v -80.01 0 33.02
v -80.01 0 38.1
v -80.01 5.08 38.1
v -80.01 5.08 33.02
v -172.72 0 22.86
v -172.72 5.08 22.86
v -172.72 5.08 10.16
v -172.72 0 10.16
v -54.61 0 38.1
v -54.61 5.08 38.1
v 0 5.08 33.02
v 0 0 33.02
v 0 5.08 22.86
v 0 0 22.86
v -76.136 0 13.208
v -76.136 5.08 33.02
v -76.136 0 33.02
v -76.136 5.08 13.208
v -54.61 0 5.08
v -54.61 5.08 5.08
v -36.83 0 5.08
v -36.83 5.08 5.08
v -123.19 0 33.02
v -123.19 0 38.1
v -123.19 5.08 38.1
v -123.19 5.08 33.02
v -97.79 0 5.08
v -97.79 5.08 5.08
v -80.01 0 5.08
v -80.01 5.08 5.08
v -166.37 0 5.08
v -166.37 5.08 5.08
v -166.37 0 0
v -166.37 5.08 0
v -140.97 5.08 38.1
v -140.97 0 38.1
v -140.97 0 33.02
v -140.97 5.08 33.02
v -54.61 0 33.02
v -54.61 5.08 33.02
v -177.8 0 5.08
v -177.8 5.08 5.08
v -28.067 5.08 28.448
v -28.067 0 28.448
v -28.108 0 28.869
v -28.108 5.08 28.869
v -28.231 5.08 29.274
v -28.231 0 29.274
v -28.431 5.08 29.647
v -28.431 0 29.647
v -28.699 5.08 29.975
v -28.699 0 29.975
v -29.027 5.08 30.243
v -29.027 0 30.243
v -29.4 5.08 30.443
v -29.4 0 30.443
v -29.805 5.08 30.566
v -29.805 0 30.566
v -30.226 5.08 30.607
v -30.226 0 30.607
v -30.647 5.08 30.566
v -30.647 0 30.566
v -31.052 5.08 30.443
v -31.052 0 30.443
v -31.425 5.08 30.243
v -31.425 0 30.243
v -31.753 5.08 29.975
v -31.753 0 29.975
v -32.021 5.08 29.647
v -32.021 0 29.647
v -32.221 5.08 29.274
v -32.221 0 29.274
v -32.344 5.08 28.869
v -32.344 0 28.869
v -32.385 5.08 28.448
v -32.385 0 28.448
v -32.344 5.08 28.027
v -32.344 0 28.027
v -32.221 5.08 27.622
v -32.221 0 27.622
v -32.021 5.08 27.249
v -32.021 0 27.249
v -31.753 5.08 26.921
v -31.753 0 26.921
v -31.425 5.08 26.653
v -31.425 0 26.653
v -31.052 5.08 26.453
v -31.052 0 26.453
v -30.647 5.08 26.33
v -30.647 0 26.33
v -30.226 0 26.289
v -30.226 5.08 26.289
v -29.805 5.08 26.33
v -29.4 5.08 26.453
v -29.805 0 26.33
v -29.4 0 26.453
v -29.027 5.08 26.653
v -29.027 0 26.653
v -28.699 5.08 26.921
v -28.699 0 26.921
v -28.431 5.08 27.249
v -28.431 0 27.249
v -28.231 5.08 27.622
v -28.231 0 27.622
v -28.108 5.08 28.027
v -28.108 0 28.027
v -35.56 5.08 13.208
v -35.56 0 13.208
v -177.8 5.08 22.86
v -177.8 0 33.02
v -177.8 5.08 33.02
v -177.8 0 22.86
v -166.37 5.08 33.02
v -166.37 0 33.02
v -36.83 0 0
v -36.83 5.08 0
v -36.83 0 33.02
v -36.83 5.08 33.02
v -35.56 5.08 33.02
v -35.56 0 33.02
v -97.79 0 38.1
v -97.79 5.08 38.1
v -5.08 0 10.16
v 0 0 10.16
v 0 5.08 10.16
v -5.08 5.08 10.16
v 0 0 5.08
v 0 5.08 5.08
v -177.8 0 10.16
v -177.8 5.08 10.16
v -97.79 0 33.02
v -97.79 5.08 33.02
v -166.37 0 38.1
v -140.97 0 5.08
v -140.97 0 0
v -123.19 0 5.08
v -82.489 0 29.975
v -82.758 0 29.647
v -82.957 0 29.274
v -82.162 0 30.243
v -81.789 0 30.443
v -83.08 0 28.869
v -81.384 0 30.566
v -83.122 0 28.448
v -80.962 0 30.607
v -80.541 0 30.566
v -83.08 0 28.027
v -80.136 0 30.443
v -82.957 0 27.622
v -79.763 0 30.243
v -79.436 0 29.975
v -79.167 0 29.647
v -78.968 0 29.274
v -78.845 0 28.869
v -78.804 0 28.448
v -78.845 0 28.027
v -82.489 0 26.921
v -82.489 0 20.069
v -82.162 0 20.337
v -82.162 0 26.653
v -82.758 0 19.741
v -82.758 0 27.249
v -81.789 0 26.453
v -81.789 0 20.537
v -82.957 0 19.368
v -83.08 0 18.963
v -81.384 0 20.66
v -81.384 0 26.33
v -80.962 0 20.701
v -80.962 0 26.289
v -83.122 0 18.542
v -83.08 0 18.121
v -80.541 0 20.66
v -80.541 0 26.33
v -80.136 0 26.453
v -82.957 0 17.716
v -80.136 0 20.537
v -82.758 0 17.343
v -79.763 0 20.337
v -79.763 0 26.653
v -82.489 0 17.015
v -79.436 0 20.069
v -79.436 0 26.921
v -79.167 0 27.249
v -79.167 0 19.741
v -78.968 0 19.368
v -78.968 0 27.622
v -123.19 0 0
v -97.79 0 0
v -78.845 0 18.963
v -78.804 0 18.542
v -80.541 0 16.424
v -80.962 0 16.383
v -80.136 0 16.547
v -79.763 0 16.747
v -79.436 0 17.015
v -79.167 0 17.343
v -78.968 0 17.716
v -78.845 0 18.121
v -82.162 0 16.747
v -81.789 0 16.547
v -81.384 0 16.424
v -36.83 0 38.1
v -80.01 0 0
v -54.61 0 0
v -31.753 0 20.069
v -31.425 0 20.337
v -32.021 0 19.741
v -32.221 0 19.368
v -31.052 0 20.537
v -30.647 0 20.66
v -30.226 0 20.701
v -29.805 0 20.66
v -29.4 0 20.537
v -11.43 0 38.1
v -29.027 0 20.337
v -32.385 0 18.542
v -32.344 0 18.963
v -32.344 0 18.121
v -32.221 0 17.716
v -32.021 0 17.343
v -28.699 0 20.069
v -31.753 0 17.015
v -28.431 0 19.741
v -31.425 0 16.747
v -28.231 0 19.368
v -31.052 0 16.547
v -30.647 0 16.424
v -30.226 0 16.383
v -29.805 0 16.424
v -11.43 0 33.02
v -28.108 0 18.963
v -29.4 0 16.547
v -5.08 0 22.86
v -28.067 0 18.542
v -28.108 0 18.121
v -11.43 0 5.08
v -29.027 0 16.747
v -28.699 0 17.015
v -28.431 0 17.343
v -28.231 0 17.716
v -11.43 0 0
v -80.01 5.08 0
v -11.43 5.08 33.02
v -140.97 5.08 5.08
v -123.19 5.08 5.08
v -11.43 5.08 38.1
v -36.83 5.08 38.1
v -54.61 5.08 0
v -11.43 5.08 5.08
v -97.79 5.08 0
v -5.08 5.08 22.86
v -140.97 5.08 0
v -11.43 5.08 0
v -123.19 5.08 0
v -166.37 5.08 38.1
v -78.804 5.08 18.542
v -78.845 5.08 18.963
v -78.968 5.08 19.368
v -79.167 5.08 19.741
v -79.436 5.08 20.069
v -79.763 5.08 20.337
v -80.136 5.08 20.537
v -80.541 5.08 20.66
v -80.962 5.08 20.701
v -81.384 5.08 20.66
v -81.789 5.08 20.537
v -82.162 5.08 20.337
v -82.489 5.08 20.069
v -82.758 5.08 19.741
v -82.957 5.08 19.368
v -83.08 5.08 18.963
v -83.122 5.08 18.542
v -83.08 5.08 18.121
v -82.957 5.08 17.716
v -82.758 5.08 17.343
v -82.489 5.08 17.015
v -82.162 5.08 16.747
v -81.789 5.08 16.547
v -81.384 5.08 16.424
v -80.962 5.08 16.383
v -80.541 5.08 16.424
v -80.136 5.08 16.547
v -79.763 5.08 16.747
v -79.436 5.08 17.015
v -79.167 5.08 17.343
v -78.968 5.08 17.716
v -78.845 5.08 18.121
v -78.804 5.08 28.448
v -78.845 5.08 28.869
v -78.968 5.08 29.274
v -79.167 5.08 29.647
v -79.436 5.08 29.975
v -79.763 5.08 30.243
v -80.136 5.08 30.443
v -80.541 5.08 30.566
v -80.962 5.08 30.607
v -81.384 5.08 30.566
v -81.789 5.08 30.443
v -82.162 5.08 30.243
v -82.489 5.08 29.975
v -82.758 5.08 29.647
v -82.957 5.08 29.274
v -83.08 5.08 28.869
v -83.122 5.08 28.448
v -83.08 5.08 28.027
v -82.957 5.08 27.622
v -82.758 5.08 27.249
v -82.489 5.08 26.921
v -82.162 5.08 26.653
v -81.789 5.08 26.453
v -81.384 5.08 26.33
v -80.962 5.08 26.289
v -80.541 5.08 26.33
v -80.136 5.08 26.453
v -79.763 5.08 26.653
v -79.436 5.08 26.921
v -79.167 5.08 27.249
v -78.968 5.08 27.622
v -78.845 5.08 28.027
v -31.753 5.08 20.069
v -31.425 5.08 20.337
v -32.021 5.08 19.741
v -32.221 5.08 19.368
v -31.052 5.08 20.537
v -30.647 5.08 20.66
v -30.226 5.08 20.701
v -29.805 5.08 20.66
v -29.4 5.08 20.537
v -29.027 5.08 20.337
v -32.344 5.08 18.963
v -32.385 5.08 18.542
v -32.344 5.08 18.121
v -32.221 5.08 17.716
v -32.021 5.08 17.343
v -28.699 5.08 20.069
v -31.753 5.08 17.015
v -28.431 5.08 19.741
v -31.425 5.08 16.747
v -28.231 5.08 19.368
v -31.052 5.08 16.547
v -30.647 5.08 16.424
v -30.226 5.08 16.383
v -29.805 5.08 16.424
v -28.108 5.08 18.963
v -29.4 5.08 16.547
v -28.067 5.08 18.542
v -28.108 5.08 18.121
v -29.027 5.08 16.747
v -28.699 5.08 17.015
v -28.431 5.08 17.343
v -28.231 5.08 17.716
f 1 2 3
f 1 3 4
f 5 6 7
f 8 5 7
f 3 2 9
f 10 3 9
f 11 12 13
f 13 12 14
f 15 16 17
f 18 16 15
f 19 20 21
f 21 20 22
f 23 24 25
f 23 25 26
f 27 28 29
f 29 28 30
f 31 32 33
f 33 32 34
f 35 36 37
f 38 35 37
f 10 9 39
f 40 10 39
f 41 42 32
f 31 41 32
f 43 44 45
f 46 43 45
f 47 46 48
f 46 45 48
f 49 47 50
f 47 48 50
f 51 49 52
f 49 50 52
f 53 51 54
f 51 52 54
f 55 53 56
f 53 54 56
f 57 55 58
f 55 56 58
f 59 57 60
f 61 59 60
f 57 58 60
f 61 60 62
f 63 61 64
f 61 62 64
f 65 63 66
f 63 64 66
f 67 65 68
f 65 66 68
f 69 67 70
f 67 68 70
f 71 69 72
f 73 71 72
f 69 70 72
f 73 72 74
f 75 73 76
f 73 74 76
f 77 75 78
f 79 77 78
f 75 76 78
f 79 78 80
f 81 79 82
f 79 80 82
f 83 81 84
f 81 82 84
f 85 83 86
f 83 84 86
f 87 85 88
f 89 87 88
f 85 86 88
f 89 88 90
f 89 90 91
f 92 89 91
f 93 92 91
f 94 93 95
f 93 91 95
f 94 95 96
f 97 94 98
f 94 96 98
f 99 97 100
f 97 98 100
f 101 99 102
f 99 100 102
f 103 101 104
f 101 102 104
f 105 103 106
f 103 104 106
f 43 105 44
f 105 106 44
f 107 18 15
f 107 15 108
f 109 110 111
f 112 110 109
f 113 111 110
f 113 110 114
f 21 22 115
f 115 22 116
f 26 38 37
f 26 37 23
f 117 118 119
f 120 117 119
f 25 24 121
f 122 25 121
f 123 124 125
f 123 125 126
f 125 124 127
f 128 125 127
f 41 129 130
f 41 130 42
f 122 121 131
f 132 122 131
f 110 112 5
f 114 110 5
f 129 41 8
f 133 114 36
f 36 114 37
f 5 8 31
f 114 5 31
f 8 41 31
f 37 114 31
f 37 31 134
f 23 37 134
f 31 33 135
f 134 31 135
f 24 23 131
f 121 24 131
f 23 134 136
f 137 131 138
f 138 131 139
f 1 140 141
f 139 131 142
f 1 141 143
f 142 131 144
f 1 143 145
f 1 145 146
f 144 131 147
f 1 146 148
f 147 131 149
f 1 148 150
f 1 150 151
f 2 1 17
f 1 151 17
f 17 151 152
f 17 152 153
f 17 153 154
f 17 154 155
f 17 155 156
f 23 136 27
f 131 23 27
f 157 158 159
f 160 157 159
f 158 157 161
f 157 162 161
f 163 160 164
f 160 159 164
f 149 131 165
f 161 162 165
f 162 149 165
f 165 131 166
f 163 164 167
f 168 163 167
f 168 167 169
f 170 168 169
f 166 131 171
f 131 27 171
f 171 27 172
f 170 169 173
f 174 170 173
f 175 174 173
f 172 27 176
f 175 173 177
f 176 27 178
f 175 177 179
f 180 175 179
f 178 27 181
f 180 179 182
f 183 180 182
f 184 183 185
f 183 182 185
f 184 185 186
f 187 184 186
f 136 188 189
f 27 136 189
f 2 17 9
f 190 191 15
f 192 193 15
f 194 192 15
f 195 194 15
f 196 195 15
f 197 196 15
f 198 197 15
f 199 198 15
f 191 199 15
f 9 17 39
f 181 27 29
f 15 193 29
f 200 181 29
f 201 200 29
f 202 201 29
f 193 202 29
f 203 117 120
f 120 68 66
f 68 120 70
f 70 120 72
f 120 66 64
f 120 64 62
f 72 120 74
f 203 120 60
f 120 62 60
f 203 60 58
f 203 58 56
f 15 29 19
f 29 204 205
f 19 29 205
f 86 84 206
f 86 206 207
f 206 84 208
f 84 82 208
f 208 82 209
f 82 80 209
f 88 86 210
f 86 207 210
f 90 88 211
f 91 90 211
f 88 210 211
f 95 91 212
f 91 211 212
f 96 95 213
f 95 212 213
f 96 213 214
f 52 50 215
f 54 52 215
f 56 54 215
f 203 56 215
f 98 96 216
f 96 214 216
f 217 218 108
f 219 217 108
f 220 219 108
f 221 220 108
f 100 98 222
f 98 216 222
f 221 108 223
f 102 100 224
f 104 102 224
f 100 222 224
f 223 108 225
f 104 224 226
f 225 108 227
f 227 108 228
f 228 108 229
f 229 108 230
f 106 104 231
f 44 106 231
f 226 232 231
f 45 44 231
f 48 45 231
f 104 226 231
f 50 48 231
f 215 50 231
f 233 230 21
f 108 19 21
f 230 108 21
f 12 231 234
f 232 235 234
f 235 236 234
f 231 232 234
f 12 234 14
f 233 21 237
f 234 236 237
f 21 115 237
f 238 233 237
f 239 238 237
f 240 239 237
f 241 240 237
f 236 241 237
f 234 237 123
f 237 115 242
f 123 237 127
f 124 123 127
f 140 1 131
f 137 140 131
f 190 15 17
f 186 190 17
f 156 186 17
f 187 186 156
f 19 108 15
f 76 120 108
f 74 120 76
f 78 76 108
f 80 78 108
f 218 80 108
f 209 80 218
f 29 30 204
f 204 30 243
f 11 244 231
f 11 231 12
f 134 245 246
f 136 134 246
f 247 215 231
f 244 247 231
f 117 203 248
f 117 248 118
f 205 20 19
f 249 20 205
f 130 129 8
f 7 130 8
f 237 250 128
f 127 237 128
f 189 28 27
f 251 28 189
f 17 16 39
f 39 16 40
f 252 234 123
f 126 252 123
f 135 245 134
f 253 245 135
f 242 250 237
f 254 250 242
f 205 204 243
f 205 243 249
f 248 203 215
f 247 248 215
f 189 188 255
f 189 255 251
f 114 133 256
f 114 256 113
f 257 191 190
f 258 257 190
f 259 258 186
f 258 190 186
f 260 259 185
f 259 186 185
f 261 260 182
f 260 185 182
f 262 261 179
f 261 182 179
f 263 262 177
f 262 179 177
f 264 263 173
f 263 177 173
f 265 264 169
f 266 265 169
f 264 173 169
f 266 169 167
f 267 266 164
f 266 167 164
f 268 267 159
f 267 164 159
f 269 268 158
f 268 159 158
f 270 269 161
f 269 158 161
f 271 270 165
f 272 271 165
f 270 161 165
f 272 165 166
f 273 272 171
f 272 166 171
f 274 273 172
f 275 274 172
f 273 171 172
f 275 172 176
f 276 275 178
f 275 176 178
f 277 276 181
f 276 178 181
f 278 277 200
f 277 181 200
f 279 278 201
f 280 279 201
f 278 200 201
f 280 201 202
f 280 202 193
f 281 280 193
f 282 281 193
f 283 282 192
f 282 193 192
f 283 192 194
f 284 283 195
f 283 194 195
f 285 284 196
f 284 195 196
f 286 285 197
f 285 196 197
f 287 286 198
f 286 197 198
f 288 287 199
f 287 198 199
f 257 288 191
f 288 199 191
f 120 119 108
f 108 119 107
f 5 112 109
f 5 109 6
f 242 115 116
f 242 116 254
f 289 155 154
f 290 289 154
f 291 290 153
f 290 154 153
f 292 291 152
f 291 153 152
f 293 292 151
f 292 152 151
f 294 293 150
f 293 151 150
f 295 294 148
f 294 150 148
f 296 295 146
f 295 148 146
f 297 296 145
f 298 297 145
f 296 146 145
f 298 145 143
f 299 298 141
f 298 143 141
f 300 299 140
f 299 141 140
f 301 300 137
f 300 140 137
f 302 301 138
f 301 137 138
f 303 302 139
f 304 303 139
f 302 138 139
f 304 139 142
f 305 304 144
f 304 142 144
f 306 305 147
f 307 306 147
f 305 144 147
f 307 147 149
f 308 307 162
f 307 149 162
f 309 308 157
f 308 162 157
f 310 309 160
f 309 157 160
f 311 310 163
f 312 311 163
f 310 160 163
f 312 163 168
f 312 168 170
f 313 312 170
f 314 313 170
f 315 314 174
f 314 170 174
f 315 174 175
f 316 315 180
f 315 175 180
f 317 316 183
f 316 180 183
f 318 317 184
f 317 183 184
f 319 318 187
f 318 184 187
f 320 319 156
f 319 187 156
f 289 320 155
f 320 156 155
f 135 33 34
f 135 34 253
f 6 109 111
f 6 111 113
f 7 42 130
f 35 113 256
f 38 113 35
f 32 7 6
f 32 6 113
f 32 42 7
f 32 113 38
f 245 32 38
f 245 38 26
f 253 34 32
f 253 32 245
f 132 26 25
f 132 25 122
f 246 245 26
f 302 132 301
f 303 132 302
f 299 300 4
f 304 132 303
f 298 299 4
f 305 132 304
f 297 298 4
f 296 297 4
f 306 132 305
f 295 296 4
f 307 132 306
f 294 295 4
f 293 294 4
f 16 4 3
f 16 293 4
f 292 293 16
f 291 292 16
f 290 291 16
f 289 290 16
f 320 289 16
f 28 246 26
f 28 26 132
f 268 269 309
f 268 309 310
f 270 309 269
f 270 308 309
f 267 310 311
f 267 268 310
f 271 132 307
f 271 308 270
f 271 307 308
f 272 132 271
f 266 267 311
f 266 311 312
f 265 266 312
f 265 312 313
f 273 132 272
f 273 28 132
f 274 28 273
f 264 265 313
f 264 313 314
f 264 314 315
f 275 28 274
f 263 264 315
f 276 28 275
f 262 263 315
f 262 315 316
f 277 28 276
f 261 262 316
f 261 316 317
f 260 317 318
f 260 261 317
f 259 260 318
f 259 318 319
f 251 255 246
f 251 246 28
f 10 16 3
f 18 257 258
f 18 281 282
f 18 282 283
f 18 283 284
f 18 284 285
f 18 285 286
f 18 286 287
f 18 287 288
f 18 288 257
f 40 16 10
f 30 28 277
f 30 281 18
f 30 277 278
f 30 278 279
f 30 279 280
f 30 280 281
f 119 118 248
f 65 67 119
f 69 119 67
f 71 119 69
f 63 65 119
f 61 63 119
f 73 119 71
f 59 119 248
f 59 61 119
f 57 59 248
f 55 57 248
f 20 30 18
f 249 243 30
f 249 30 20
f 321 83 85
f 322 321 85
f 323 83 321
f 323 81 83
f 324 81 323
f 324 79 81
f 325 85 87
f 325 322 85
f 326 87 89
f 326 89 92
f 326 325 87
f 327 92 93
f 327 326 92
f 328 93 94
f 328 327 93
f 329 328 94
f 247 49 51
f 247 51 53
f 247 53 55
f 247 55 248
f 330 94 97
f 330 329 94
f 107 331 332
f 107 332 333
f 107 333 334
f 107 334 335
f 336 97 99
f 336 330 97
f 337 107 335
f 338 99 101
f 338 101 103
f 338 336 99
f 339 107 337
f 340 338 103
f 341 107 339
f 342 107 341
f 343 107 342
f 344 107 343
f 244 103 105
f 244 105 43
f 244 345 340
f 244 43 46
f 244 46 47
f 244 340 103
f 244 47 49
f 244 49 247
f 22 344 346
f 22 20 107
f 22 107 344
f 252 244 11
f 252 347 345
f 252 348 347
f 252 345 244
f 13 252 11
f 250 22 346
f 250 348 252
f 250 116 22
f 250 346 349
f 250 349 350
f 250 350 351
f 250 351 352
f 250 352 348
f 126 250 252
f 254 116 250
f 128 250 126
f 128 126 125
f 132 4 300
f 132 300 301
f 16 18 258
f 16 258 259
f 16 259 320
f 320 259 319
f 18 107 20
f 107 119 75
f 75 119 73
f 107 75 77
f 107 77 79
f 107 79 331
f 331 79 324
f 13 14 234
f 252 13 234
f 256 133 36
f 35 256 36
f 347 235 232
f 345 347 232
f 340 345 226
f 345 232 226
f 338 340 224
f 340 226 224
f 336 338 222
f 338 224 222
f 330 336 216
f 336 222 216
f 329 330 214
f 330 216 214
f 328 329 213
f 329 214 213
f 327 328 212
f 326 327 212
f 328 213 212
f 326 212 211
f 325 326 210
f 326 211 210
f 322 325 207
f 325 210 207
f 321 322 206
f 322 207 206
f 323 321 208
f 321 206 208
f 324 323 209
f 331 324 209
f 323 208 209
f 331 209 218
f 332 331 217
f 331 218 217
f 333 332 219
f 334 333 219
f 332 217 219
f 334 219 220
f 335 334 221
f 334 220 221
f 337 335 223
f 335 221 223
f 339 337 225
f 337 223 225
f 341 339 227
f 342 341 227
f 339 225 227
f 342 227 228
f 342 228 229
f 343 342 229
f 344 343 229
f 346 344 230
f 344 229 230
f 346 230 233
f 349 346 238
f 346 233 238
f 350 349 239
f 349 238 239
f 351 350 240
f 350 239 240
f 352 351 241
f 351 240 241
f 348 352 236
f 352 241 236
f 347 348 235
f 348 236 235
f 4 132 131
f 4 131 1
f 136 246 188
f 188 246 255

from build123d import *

# Parameters (mm, degrees)
SKETCH1_W           = 177.8
SKETCH1_H           = 38.1
BOSS_EXTRUDE1_DEPTH = 5.08
SKETCH2_W           = 11.43
SKETCH2_H           = 5.08
CUT_EXTRUDE1_DEPTH  = 5.08
SKETCH3_W           = 11.43
SKETCH3_H           = 5.08
CUT_EXTRUDE2_DEPTH  = 5.08
SKETCH4_W           = 17.78
SKETCH4_H           = 5.08
CUT_EXTRUDE3_DEPTH  = 5.08
LPATTERN1_COUNT     = 3
LPATTERN1_PITCH     = 43.18
SKETCH5_W           = 40.5765
SKETCH5_H           = 19.812
CUT_EXTRUDE4_DEPTH  = 5.08
SKETCH6_W           = 5.08
SKETCH6_H           = 12.7
CUT_EXTRUDE5_DEPTH  = 5.08
SKETCH7_W           = 11.43
SKETCH7_H           = 5.08
SKETCH7_W_2         = 17.78
CUT_EXTRUDE6_DEPTH  = 5.08
SKETCH8_W           = 17.78
SKETCH8_H           = 5.08
CUT_EXTRUDE7_DEPTH  = 5.08
LPATTERN2_COUNT     = 2
LPATTERN2_PITCH     = 43.18
SKETCH9_W           = 5.08
SKETCH9_H           = 12.7
CUT_EXTRUDE8_DEPTH  = 5.08
SKETCH10_R          = 2.159
CUT_EXTRUDE9_DEPTH  = 5.08


with BuildPart() as part:
    # Sketch1 → Boss-Extrude1 (new body)
    with BuildSketch(Plane(origin=(0, 0, 0), x_dir=(1, 0, 0), z_dir=(0, 1, 0))):
        with Locations((-88.9, -19.05)):
            Rectangle(SKETCH1_W, SKETCH1_H)
    extrude(amount=BOSS_EXTRUDE1_DEPTH)

    # Sketch2 → Cut-Extrude1 (cut)
    with BuildSketch(Plane(origin=(0, 5.08, 0), x_dir=(1, 0, 0), z_dir=(0, 1, 0))):
        with Locations((-172.085, -35.56)):
            Rectangle(SKETCH2_W, SKETCH2_H)
    extrude(amount=-CUT_EXTRUDE1_DEPTH, mode=Mode.SUBTRACT)

    # Sketch3 → Cut-Extrude2 (cut)
    with BuildSketch(Plane(origin=(0, 5.08, 0), x_dir=(1, 0, 0), z_dir=(0, 1, 0))):
        with Locations((-5.715, -35.56)):
            Rectangle(SKETCH3_W, SKETCH3_H)
    extrude(amount=-CUT_EXTRUDE2_DEPTH, mode=Mode.SUBTRACT)

    # Sketch4 → Cut-Extrude3 (cut)
    with BuildSketch(Plane(origin=(0, 5.08, 0), x_dir=(1, 0, 0), z_dir=(0, 1, 0))):
        with Locations((-132.08, -35.56)):
            Rectangle(SKETCH4_W, SKETCH4_H)
    cut_extrude3 = extrude(amount=-CUT_EXTRUDE3_DEPTH, mode=Mode.SUBTRACT)

    # LPattern1: Cut-Extrude3 ×3
    with Locations(*[(i * LPATTERN1_PITCH, 0, 0) for i in range(1, LPATTERN1_COUNT)]):
        add(cut_extrude3, mode=Mode.SUBTRACT)

    # Sketch5 → Cut-Extrude4 (cut)
    with BuildSketch(Plane(origin=(0, 5.08, 0), x_dir=(1, 0, 0), z_dir=(0, 1, 0))):
        with Locations((-55.84825, -23.114)):
            Rectangle(SKETCH5_W, SKETCH5_H)
    extrude(amount=-CUT_EXTRUDE4_DEPTH, mode=Mode.SUBTRACT)

    # Sketch6 → Cut-Extrude5 (cut)
    with BuildSketch(Plane(origin=(0, 0, 0), x_dir=(-1, 0, 0), z_dir=(0, -1, 0))):
        with Locations((2.54, -16.51)):
            Rectangle(SKETCH6_W, SKETCH6_H)
    extrude(amount=-CUT_EXTRUDE5_DEPTH, mode=Mode.SUBTRACT)

    # Sketch7 → Cut-Extrude6 (cut)
    with BuildSketch(Plane(origin=(0, 5.08, 0), x_dir=(1, 0, 0), z_dir=(0, 1, 0))):
        with Locations((-172.085, -2.54)):
            Rectangle(SKETCH7_W, SKETCH7_H)
        with Locations((-132.08, -2.54)):
            Rectangle(SKETCH7_W_2, SKETCH7_H)
        with Locations((-5.715, -2.54)):
            Rectangle(SKETCH7_W, SKETCH7_H)
    extrude(amount=-CUT_EXTRUDE6_DEPTH, mode=Mode.SUBTRACT)

    # Sketch8 → Cut-Extrude7 (cut)
    with BuildSketch(Plane(origin=(0, 5.08, 0), x_dir=(1, 0, 0), z_dir=(0, 1, 0))):
        with Locations((-88.9, -2.54)):
            Rectangle(SKETCH8_W, SKETCH8_H)
    cut_extrude7 = extrude(amount=-CUT_EXTRUDE7_DEPTH, mode=Mode.SUBTRACT)

    # LPattern2: Cut-Extrude7 ×2
    with Locations(*[(i * LPATTERN2_PITCH, 0, 0) for i in range(1, LPATTERN2_COUNT)]):
        add(cut_extrude7, mode=Mode.SUBTRACT)

    # Sketch9 → Cut-Extrude8 (cut)
    with BuildSketch(Plane(origin=(0, 5.08, 0), x_dir=(1, 0, 0), z_dir=(0, 1, 0))):
        with Locations((-175.26, -16.51)):
            Rectangle(SKETCH9_W, SKETCH9_H)
    extrude(amount=-CUT_EXTRUDE8_DEPTH, mode=Mode.SUBTRACT)

    # Sketch10 → Cut-Extrude9 (cut)
    with BuildSketch(Plane.XZ):
        with Locations((-80.9625, 18.542)):
            Circle(SKETCH10_R)
        with Locations((-80.9625, 28.448)):
            Circle(SKETCH10_R)
        with Locations((-30.226, 28.448)):
            Circle(SKETCH10_R)
        with Locations((-30.226, 18.542)):
            Circle(SKETCH10_R)
    extrude(amount=-CUT_EXTRUDE9_DEPTH, mode=Mode.SUBTRACT)


solid = part.part
